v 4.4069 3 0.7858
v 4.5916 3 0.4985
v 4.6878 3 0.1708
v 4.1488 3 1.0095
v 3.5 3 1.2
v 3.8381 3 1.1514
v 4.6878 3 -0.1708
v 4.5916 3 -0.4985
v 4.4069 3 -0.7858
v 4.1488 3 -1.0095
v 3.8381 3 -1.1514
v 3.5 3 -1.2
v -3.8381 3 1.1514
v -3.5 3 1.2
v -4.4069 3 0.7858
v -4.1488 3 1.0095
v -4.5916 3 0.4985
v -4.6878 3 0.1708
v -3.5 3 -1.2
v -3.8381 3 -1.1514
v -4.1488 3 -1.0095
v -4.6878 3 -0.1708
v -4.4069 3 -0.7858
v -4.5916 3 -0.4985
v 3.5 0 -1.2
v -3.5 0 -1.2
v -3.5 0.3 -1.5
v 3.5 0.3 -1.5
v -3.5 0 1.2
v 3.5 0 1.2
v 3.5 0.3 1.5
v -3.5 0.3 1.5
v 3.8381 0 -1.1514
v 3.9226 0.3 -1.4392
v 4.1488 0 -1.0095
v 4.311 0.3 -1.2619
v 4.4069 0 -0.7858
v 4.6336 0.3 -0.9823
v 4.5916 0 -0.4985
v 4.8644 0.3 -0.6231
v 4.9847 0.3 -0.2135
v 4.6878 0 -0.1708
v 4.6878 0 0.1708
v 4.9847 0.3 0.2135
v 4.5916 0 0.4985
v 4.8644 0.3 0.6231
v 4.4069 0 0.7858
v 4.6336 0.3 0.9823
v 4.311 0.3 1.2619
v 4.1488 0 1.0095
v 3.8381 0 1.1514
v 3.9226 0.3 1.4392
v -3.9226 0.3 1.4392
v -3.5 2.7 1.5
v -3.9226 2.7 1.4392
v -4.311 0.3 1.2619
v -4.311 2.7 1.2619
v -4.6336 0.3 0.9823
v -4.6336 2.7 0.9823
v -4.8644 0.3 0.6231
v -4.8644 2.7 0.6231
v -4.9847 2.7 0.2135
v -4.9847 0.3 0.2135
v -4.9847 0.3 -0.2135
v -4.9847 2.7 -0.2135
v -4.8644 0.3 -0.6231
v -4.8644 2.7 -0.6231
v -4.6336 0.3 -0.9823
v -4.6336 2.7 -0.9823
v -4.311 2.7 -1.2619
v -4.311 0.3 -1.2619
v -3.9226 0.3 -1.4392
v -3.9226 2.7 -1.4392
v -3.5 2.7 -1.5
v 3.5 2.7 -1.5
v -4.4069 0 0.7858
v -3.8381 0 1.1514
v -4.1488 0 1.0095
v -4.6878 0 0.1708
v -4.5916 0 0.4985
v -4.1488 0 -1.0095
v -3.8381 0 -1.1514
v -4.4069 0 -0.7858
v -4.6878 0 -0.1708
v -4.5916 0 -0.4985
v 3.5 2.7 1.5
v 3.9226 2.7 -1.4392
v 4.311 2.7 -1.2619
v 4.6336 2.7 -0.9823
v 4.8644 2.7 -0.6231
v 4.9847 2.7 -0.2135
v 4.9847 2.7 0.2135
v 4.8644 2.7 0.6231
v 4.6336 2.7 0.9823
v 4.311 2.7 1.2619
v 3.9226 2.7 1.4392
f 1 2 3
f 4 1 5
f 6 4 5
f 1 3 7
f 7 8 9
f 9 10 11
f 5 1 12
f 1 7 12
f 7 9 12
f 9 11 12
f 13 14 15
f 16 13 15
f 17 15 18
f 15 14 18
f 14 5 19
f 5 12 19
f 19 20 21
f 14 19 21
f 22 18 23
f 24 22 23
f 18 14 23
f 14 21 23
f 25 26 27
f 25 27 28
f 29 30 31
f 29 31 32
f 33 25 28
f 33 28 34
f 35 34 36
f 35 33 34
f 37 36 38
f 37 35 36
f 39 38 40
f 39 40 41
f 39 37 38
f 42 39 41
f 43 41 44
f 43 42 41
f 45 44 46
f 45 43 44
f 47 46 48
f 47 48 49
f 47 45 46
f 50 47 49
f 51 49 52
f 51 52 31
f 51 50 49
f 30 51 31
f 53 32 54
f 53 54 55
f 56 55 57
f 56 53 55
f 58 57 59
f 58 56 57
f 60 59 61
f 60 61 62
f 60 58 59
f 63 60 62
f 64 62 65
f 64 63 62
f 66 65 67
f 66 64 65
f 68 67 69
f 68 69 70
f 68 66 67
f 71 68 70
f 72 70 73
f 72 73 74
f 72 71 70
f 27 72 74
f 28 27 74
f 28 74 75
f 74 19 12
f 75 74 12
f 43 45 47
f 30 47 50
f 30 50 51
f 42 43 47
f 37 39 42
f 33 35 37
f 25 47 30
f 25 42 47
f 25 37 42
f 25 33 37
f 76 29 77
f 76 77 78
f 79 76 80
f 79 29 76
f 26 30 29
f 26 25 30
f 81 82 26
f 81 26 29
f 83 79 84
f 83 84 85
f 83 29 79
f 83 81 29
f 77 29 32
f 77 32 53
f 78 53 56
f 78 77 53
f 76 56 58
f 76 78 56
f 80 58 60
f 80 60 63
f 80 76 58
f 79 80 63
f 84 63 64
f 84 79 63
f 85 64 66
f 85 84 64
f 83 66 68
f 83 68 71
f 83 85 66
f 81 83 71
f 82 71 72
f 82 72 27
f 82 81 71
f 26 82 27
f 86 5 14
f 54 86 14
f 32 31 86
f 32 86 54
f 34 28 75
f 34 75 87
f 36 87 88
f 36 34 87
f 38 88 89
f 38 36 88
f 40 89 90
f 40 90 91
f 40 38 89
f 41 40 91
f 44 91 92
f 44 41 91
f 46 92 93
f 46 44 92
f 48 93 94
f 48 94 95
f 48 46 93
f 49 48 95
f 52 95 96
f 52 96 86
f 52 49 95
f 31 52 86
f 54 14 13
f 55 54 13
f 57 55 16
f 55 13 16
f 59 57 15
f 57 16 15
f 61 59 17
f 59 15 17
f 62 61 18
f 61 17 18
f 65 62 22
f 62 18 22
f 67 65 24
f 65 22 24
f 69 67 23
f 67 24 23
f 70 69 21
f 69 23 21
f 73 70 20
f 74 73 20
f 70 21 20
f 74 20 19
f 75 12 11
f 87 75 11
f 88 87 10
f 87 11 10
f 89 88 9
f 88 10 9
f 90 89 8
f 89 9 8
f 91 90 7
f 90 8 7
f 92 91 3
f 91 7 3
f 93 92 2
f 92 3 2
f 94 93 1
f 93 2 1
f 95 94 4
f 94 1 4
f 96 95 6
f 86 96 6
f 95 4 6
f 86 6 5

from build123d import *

# Parameters (mm, degrees)
EXTRUDE_1_DEPTH = 3
CHAMFER_1_SIZE  = 0.3


with BuildPart() as part:
    # 草图1 → 凸台-拉伸1 (new body)
    with BuildSketch(Plane(origin=(0, 0, 0), x_dir=(1, 0, 0), z_dir=(0, 1, 0))):
        with BuildLine():
            Line((-3.5, 1.5), (3.5, 1.5))
            ThreePointArc((3.5, 1.5), (5, 0), (3.5, -1.5))
            Line((3.5, -1.5), (-3.5, -1.5))
            ThreePointArc((-3.5, -1.5), (-5, 0), (-3.5, 1.5))
        make_face()
    extrude(amount=EXTRUDE_1_DEPTH)

    # 倒角1
    chamfer_1_edges = [part.edges().sort_by_distance(p)[0] for p in [
        (5, 3, 0),
        (0, 3, -1.5),
        (-5, 3, 0),
        (0, 0, -1.5),
        (5, 0, 0),
        (0, 0, 1.5),
        (-5, 0, 0),
        (0, 3, 1.5),
    ]]
    chamfer(chamfer_1_edges, length=CHAMFER_1_SIZE)


solid = part.part
